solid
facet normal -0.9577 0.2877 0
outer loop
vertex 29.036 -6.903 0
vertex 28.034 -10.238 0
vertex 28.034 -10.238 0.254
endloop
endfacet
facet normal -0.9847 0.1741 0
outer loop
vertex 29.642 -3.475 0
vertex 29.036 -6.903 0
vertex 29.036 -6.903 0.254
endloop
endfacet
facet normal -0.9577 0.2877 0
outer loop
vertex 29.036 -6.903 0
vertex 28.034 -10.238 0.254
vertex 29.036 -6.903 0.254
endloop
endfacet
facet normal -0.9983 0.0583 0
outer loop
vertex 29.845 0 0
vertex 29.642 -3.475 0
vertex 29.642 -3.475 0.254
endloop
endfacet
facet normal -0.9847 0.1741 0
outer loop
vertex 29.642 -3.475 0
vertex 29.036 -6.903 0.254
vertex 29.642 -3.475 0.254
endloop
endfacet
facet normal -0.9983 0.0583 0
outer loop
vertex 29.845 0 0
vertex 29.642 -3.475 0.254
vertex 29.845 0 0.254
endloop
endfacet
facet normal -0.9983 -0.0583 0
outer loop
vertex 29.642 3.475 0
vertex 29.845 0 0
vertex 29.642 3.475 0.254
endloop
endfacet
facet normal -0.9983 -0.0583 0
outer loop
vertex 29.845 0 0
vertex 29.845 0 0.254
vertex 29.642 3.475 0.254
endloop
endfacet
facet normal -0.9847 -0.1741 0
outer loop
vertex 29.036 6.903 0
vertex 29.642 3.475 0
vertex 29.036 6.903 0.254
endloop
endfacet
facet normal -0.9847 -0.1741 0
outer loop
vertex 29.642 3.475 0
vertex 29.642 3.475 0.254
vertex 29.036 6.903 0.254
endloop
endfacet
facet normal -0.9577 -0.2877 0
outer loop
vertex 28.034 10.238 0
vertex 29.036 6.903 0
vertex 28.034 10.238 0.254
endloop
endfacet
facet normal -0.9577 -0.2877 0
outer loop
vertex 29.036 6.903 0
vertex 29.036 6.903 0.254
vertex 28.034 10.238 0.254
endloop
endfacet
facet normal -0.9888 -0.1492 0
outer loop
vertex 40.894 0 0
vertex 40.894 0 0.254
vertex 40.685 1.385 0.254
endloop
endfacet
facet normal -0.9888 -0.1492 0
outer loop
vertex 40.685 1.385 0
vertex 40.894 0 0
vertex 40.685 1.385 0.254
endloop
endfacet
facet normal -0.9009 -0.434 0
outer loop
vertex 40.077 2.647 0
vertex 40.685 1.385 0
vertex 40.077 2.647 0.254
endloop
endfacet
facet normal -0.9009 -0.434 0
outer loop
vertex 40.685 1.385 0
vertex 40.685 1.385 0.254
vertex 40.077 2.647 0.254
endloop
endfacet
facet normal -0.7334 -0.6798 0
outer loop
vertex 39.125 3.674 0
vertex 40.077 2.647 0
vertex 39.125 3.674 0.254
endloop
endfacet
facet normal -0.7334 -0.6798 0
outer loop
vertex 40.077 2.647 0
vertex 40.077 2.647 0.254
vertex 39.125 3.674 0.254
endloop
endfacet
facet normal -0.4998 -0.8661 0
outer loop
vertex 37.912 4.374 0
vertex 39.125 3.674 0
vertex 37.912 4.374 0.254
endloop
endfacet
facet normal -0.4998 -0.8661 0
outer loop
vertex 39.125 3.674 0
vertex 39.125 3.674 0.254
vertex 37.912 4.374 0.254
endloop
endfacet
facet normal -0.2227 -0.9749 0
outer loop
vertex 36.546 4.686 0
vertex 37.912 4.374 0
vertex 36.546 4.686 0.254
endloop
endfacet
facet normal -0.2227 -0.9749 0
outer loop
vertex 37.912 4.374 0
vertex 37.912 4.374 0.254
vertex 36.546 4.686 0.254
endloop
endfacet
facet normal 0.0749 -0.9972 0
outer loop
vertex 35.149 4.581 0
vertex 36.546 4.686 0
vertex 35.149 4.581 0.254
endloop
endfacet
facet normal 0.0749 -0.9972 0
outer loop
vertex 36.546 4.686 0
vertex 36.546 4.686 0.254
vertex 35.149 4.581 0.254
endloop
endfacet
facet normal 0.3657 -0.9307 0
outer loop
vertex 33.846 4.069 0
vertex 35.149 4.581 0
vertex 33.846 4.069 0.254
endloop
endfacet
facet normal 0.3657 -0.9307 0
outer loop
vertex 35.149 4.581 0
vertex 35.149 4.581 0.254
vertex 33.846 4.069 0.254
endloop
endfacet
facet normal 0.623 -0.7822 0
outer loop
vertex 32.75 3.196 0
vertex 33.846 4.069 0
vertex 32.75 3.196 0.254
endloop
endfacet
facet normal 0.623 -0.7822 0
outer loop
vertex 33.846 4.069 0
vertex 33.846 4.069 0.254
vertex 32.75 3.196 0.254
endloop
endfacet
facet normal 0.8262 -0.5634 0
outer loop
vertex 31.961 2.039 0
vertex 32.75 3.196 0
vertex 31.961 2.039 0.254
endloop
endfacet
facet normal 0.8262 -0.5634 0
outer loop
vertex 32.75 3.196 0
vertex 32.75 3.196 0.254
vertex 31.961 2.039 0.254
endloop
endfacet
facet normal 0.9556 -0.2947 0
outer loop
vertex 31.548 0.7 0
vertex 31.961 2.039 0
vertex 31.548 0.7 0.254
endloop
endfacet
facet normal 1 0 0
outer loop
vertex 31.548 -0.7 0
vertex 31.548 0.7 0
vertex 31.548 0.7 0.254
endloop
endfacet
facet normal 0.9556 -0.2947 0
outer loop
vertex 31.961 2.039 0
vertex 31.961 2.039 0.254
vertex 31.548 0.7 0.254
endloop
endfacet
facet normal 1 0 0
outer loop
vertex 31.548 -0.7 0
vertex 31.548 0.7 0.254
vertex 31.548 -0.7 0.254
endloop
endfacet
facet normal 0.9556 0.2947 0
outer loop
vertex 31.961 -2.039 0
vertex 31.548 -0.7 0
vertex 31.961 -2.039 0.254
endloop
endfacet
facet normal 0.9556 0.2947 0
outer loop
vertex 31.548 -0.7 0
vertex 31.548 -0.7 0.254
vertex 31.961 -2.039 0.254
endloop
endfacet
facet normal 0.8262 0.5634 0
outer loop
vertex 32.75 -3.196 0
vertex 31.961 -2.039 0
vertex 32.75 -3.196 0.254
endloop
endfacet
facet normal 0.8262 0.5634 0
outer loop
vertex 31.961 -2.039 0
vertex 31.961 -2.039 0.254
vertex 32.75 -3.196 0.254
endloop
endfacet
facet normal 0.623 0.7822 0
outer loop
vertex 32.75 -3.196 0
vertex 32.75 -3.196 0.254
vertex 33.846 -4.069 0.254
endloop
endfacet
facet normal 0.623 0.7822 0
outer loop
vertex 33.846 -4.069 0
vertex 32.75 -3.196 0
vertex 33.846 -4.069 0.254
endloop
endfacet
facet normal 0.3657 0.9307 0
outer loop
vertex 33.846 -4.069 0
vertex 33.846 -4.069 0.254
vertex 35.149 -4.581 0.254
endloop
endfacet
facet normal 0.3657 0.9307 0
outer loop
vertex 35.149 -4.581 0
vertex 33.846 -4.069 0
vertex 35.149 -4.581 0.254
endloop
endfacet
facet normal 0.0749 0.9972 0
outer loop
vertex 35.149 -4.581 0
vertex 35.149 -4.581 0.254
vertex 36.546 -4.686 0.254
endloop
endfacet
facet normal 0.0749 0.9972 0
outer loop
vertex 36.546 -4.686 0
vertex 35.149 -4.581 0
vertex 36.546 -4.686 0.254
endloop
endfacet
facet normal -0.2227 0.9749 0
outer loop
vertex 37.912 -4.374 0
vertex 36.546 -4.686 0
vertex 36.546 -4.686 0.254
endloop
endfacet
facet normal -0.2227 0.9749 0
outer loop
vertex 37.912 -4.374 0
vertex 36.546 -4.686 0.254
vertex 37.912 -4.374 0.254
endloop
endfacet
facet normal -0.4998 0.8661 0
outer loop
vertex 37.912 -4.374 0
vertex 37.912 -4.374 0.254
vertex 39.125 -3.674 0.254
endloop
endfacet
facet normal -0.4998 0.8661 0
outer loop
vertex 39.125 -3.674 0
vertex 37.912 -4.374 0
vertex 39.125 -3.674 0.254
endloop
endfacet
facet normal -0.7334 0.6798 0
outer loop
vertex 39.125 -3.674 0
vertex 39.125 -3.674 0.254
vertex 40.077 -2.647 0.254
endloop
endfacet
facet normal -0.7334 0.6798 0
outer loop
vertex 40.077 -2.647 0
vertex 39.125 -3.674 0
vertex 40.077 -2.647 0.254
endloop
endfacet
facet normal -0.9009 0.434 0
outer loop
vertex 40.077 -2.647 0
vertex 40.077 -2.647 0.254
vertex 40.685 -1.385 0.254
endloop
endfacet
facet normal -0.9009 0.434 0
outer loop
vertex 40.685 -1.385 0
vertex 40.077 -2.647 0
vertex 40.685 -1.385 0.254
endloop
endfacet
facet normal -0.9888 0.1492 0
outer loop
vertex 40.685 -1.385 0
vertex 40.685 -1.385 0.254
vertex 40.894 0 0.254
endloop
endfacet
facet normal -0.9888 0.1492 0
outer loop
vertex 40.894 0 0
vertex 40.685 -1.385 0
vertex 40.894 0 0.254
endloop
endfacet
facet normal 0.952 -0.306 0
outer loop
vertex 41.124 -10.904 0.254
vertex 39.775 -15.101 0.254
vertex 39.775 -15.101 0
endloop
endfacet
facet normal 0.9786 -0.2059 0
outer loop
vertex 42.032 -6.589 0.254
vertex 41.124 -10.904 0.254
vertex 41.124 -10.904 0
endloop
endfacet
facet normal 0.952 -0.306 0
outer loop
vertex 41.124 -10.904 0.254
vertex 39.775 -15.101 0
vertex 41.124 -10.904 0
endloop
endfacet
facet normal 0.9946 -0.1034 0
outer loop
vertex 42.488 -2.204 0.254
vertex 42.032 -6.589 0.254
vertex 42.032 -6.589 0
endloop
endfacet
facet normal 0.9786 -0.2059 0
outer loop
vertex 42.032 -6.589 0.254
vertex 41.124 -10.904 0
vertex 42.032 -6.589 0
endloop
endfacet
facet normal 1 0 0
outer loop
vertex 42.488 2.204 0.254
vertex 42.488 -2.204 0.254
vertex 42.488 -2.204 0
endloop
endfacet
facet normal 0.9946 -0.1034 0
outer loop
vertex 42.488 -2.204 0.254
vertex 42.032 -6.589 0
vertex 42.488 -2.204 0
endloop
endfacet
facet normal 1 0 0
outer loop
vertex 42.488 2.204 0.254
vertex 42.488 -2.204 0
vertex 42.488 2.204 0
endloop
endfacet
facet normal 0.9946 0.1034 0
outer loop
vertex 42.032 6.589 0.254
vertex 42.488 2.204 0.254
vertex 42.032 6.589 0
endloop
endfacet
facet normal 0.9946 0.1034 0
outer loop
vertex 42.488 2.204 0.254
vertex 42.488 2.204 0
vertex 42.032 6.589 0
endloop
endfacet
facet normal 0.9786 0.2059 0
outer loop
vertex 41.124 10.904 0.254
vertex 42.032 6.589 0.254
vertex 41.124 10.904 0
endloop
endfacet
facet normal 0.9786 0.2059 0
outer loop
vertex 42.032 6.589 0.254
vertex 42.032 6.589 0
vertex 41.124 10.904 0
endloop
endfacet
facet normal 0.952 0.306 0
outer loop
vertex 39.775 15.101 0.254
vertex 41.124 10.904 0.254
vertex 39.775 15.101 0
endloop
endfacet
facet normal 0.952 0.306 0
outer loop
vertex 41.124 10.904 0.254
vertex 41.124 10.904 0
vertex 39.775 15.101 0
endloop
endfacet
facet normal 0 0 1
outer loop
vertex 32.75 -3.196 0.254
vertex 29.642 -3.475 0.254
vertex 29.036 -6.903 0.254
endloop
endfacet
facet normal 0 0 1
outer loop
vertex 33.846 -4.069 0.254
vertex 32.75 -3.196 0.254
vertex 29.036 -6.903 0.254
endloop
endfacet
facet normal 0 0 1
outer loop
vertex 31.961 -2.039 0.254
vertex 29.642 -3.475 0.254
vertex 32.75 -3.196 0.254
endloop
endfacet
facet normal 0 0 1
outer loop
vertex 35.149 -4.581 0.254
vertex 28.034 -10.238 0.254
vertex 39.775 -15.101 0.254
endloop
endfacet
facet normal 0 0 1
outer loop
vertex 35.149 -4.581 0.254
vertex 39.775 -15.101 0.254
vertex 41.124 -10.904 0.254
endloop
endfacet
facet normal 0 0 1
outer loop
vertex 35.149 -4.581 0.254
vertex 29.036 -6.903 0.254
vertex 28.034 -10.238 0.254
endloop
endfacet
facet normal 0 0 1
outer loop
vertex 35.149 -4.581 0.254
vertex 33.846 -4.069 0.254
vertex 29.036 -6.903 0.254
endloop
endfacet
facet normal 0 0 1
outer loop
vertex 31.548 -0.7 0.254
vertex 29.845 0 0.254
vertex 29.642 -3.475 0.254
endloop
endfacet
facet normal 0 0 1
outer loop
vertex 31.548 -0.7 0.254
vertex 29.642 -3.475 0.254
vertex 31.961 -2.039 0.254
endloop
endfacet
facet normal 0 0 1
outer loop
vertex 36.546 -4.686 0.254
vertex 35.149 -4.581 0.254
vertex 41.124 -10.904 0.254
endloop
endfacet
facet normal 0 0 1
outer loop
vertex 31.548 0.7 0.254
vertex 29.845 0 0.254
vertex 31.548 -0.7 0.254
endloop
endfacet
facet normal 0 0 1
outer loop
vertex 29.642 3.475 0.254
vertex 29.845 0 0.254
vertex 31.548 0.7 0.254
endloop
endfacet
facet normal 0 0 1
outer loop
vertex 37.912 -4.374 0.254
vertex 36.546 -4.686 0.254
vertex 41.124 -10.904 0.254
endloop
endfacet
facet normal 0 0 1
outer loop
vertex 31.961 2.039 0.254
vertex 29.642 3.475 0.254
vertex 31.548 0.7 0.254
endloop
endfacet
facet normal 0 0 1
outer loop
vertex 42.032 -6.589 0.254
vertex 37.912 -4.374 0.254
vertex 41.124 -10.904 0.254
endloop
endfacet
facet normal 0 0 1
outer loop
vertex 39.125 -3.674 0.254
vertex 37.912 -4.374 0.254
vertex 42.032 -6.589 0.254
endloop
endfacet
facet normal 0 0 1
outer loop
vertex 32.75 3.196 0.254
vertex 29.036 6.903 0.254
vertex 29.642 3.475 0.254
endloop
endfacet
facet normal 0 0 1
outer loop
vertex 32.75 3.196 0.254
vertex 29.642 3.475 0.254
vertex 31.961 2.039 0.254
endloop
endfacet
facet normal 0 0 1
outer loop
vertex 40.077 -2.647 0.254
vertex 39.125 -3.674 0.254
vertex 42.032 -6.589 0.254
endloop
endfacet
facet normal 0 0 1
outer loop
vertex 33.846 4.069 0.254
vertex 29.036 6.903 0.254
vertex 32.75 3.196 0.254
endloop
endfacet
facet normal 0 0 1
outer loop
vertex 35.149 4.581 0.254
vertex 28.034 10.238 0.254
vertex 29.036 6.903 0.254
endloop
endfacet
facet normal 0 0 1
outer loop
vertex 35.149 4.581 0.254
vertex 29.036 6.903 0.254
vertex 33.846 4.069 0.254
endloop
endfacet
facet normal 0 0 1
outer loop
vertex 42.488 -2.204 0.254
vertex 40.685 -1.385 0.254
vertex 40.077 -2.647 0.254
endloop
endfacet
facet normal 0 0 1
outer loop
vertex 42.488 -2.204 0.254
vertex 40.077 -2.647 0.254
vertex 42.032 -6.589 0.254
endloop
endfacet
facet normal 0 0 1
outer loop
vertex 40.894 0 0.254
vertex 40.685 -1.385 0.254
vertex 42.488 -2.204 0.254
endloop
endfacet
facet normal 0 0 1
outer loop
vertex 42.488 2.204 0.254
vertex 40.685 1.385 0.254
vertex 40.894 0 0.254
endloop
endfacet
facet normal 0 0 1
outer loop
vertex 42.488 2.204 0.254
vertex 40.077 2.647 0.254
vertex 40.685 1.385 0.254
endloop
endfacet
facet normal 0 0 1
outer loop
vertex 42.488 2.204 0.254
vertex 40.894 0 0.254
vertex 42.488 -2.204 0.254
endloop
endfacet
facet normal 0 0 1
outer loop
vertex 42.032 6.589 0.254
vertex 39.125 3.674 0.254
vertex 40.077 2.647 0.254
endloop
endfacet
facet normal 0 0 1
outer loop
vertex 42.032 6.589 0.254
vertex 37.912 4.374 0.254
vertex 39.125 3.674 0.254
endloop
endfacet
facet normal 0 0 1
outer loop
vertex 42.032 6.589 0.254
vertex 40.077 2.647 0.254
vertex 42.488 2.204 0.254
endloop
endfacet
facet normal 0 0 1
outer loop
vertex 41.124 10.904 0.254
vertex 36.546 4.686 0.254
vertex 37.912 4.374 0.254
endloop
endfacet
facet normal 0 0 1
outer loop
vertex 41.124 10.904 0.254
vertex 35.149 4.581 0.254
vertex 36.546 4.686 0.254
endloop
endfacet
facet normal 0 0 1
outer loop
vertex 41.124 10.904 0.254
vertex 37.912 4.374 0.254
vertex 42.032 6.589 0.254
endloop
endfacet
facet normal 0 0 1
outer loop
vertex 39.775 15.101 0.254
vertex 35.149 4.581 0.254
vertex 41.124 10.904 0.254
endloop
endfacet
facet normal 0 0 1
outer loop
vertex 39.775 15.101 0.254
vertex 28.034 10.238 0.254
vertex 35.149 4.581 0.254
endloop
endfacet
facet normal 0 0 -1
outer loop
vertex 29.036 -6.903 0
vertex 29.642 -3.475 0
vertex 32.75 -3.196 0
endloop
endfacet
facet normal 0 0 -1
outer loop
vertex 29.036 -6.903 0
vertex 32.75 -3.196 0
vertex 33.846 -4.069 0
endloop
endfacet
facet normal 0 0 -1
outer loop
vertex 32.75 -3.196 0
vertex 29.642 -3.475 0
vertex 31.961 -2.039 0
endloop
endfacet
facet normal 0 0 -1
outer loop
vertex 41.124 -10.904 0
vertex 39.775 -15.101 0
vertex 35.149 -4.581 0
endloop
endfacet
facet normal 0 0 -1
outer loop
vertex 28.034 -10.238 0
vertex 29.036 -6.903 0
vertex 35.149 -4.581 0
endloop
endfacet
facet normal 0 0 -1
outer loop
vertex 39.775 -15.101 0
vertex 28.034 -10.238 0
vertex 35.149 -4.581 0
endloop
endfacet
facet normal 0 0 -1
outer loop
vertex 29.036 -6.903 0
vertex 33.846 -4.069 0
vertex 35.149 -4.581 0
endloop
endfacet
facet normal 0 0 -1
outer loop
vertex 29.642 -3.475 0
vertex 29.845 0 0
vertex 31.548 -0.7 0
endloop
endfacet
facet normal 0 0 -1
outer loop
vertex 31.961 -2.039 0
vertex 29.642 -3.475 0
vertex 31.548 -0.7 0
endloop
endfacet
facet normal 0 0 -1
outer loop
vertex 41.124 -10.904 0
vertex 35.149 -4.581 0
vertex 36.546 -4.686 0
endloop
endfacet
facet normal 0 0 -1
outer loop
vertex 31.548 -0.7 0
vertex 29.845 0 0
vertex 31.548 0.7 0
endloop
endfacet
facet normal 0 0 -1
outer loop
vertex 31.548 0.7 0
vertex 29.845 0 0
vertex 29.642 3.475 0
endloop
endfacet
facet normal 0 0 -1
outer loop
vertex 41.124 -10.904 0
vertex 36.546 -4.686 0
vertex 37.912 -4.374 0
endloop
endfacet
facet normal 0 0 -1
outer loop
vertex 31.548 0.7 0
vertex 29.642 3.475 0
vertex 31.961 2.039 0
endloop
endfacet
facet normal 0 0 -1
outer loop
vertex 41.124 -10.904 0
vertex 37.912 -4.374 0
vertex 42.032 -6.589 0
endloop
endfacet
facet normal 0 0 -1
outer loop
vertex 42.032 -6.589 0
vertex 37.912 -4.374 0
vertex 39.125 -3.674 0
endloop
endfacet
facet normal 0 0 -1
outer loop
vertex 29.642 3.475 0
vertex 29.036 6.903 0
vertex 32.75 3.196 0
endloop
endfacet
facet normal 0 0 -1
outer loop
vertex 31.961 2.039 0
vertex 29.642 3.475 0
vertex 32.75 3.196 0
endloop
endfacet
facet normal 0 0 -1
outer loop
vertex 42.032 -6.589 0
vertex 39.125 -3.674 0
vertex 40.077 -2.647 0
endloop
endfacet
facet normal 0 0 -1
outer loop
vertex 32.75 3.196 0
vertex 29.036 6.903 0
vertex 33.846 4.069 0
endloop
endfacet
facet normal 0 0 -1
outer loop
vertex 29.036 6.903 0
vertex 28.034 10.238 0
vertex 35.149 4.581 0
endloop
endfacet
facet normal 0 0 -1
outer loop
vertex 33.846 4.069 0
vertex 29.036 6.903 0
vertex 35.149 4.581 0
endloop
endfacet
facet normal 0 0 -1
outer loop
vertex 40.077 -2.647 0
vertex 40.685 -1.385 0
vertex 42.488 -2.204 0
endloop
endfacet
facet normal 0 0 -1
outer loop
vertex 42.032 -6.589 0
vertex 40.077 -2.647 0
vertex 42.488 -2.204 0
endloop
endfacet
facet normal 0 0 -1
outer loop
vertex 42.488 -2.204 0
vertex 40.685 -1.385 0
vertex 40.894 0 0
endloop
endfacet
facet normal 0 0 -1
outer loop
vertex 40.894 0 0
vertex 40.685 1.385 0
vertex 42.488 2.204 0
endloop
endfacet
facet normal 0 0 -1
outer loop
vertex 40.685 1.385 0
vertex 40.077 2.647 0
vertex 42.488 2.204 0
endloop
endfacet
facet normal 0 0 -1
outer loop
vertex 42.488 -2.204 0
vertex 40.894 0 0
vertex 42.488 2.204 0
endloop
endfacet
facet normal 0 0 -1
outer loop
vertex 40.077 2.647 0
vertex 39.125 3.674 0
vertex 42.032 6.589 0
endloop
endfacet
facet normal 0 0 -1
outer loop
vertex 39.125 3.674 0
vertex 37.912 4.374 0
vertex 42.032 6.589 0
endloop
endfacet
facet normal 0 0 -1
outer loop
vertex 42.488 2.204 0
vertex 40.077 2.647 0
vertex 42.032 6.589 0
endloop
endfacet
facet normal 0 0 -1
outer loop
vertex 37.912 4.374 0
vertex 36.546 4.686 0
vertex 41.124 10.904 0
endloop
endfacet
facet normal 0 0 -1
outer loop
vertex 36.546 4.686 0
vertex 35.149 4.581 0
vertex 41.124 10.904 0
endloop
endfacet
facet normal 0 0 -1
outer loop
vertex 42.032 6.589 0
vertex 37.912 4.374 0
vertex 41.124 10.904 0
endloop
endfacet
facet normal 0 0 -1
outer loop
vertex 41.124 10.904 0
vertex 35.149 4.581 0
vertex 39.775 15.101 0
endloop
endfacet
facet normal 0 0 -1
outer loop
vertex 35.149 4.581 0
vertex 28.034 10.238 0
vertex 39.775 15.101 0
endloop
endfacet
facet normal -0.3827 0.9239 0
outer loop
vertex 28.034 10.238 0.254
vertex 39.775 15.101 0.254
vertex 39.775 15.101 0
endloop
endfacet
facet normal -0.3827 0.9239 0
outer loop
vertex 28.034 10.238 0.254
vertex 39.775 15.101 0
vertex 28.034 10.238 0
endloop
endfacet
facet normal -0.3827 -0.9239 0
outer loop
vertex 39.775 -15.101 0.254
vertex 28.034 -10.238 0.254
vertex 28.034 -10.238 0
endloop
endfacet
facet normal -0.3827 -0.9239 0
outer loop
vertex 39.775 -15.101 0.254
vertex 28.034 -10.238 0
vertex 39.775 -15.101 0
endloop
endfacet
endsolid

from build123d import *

# Parameters (mm, degrees)
SKETCH4_R           = 42.545
BOSS_EXTRUDE2_DEPTH = 0.254
SKETCH5_R           = 29.845
CUT_EXTRUDE5_DEPTH  = 1.254
SKETCH6_R           = 4.699
CUT_EXTRUDE6_DEPTH  = 1.254
SKETCH8_OUTSIDE_W   = 111.158
SKETCH8_OUTSIDE_H   = 111.158
CUT_EXTRUDE11_DEPTH = 1.254


with BuildPart() as part:
    # Sketch4 → Boss-Extrude2 (new body)
    with BuildSketch(Plane.XY):
        Circle(SKETCH4_R)
    extrude(amount=BOSS_EXTRUDE2_DEPTH)

    # Sketch5 → Cut-Extrude5 (cut, through all)
    with BuildSketch(Plane.XY.offset(0.254)):
        Circle(SKETCH5_R)
    extrude(amount=-CUT_EXTRUDE5_DEPTH, mode=Mode.SUBTRACT)

    # Sketch6 → Cut-Extrude6 (cut, through all)
    with BuildSketch(Plane.XY.offset(0.254)):
        with Locations((36.195, 0)):
            Circle(SKETCH6_R)
    extrude(amount=-CUT_EXTRUDE6_DEPTH, mode=Mode.SUBTRACT)

    # Sketch8 outside → Cut-Extrude11 (cut, through all)
    with BuildSketch(Plane.XY.offset(0.254)):
        Rectangle(SKETCH8_OUTSIDE_W, SKETCH8_OUTSIDE_H)
        with BuildLine():
            Line((28.034216891, -10.237514752), (39.774946424, -15.100684157))
            ThreePointArc((39.774946424, -15.100684157), (42.545, 0), (39.774946424, 15.100684157))
            Line((39.774946424, 15.100684157), (28.034216891, 10.237514752))
            ThreePointArc((28.034216891, 10.237514752), (29.845, 0), (28.034216891, -10.237514752))
        make_face(mode=Mode.SUBTRACT)
    extrude(amount=-CUT_EXTRUDE11_DEPTH, mode=Mode.SUBTRACT)


solid = part.part
